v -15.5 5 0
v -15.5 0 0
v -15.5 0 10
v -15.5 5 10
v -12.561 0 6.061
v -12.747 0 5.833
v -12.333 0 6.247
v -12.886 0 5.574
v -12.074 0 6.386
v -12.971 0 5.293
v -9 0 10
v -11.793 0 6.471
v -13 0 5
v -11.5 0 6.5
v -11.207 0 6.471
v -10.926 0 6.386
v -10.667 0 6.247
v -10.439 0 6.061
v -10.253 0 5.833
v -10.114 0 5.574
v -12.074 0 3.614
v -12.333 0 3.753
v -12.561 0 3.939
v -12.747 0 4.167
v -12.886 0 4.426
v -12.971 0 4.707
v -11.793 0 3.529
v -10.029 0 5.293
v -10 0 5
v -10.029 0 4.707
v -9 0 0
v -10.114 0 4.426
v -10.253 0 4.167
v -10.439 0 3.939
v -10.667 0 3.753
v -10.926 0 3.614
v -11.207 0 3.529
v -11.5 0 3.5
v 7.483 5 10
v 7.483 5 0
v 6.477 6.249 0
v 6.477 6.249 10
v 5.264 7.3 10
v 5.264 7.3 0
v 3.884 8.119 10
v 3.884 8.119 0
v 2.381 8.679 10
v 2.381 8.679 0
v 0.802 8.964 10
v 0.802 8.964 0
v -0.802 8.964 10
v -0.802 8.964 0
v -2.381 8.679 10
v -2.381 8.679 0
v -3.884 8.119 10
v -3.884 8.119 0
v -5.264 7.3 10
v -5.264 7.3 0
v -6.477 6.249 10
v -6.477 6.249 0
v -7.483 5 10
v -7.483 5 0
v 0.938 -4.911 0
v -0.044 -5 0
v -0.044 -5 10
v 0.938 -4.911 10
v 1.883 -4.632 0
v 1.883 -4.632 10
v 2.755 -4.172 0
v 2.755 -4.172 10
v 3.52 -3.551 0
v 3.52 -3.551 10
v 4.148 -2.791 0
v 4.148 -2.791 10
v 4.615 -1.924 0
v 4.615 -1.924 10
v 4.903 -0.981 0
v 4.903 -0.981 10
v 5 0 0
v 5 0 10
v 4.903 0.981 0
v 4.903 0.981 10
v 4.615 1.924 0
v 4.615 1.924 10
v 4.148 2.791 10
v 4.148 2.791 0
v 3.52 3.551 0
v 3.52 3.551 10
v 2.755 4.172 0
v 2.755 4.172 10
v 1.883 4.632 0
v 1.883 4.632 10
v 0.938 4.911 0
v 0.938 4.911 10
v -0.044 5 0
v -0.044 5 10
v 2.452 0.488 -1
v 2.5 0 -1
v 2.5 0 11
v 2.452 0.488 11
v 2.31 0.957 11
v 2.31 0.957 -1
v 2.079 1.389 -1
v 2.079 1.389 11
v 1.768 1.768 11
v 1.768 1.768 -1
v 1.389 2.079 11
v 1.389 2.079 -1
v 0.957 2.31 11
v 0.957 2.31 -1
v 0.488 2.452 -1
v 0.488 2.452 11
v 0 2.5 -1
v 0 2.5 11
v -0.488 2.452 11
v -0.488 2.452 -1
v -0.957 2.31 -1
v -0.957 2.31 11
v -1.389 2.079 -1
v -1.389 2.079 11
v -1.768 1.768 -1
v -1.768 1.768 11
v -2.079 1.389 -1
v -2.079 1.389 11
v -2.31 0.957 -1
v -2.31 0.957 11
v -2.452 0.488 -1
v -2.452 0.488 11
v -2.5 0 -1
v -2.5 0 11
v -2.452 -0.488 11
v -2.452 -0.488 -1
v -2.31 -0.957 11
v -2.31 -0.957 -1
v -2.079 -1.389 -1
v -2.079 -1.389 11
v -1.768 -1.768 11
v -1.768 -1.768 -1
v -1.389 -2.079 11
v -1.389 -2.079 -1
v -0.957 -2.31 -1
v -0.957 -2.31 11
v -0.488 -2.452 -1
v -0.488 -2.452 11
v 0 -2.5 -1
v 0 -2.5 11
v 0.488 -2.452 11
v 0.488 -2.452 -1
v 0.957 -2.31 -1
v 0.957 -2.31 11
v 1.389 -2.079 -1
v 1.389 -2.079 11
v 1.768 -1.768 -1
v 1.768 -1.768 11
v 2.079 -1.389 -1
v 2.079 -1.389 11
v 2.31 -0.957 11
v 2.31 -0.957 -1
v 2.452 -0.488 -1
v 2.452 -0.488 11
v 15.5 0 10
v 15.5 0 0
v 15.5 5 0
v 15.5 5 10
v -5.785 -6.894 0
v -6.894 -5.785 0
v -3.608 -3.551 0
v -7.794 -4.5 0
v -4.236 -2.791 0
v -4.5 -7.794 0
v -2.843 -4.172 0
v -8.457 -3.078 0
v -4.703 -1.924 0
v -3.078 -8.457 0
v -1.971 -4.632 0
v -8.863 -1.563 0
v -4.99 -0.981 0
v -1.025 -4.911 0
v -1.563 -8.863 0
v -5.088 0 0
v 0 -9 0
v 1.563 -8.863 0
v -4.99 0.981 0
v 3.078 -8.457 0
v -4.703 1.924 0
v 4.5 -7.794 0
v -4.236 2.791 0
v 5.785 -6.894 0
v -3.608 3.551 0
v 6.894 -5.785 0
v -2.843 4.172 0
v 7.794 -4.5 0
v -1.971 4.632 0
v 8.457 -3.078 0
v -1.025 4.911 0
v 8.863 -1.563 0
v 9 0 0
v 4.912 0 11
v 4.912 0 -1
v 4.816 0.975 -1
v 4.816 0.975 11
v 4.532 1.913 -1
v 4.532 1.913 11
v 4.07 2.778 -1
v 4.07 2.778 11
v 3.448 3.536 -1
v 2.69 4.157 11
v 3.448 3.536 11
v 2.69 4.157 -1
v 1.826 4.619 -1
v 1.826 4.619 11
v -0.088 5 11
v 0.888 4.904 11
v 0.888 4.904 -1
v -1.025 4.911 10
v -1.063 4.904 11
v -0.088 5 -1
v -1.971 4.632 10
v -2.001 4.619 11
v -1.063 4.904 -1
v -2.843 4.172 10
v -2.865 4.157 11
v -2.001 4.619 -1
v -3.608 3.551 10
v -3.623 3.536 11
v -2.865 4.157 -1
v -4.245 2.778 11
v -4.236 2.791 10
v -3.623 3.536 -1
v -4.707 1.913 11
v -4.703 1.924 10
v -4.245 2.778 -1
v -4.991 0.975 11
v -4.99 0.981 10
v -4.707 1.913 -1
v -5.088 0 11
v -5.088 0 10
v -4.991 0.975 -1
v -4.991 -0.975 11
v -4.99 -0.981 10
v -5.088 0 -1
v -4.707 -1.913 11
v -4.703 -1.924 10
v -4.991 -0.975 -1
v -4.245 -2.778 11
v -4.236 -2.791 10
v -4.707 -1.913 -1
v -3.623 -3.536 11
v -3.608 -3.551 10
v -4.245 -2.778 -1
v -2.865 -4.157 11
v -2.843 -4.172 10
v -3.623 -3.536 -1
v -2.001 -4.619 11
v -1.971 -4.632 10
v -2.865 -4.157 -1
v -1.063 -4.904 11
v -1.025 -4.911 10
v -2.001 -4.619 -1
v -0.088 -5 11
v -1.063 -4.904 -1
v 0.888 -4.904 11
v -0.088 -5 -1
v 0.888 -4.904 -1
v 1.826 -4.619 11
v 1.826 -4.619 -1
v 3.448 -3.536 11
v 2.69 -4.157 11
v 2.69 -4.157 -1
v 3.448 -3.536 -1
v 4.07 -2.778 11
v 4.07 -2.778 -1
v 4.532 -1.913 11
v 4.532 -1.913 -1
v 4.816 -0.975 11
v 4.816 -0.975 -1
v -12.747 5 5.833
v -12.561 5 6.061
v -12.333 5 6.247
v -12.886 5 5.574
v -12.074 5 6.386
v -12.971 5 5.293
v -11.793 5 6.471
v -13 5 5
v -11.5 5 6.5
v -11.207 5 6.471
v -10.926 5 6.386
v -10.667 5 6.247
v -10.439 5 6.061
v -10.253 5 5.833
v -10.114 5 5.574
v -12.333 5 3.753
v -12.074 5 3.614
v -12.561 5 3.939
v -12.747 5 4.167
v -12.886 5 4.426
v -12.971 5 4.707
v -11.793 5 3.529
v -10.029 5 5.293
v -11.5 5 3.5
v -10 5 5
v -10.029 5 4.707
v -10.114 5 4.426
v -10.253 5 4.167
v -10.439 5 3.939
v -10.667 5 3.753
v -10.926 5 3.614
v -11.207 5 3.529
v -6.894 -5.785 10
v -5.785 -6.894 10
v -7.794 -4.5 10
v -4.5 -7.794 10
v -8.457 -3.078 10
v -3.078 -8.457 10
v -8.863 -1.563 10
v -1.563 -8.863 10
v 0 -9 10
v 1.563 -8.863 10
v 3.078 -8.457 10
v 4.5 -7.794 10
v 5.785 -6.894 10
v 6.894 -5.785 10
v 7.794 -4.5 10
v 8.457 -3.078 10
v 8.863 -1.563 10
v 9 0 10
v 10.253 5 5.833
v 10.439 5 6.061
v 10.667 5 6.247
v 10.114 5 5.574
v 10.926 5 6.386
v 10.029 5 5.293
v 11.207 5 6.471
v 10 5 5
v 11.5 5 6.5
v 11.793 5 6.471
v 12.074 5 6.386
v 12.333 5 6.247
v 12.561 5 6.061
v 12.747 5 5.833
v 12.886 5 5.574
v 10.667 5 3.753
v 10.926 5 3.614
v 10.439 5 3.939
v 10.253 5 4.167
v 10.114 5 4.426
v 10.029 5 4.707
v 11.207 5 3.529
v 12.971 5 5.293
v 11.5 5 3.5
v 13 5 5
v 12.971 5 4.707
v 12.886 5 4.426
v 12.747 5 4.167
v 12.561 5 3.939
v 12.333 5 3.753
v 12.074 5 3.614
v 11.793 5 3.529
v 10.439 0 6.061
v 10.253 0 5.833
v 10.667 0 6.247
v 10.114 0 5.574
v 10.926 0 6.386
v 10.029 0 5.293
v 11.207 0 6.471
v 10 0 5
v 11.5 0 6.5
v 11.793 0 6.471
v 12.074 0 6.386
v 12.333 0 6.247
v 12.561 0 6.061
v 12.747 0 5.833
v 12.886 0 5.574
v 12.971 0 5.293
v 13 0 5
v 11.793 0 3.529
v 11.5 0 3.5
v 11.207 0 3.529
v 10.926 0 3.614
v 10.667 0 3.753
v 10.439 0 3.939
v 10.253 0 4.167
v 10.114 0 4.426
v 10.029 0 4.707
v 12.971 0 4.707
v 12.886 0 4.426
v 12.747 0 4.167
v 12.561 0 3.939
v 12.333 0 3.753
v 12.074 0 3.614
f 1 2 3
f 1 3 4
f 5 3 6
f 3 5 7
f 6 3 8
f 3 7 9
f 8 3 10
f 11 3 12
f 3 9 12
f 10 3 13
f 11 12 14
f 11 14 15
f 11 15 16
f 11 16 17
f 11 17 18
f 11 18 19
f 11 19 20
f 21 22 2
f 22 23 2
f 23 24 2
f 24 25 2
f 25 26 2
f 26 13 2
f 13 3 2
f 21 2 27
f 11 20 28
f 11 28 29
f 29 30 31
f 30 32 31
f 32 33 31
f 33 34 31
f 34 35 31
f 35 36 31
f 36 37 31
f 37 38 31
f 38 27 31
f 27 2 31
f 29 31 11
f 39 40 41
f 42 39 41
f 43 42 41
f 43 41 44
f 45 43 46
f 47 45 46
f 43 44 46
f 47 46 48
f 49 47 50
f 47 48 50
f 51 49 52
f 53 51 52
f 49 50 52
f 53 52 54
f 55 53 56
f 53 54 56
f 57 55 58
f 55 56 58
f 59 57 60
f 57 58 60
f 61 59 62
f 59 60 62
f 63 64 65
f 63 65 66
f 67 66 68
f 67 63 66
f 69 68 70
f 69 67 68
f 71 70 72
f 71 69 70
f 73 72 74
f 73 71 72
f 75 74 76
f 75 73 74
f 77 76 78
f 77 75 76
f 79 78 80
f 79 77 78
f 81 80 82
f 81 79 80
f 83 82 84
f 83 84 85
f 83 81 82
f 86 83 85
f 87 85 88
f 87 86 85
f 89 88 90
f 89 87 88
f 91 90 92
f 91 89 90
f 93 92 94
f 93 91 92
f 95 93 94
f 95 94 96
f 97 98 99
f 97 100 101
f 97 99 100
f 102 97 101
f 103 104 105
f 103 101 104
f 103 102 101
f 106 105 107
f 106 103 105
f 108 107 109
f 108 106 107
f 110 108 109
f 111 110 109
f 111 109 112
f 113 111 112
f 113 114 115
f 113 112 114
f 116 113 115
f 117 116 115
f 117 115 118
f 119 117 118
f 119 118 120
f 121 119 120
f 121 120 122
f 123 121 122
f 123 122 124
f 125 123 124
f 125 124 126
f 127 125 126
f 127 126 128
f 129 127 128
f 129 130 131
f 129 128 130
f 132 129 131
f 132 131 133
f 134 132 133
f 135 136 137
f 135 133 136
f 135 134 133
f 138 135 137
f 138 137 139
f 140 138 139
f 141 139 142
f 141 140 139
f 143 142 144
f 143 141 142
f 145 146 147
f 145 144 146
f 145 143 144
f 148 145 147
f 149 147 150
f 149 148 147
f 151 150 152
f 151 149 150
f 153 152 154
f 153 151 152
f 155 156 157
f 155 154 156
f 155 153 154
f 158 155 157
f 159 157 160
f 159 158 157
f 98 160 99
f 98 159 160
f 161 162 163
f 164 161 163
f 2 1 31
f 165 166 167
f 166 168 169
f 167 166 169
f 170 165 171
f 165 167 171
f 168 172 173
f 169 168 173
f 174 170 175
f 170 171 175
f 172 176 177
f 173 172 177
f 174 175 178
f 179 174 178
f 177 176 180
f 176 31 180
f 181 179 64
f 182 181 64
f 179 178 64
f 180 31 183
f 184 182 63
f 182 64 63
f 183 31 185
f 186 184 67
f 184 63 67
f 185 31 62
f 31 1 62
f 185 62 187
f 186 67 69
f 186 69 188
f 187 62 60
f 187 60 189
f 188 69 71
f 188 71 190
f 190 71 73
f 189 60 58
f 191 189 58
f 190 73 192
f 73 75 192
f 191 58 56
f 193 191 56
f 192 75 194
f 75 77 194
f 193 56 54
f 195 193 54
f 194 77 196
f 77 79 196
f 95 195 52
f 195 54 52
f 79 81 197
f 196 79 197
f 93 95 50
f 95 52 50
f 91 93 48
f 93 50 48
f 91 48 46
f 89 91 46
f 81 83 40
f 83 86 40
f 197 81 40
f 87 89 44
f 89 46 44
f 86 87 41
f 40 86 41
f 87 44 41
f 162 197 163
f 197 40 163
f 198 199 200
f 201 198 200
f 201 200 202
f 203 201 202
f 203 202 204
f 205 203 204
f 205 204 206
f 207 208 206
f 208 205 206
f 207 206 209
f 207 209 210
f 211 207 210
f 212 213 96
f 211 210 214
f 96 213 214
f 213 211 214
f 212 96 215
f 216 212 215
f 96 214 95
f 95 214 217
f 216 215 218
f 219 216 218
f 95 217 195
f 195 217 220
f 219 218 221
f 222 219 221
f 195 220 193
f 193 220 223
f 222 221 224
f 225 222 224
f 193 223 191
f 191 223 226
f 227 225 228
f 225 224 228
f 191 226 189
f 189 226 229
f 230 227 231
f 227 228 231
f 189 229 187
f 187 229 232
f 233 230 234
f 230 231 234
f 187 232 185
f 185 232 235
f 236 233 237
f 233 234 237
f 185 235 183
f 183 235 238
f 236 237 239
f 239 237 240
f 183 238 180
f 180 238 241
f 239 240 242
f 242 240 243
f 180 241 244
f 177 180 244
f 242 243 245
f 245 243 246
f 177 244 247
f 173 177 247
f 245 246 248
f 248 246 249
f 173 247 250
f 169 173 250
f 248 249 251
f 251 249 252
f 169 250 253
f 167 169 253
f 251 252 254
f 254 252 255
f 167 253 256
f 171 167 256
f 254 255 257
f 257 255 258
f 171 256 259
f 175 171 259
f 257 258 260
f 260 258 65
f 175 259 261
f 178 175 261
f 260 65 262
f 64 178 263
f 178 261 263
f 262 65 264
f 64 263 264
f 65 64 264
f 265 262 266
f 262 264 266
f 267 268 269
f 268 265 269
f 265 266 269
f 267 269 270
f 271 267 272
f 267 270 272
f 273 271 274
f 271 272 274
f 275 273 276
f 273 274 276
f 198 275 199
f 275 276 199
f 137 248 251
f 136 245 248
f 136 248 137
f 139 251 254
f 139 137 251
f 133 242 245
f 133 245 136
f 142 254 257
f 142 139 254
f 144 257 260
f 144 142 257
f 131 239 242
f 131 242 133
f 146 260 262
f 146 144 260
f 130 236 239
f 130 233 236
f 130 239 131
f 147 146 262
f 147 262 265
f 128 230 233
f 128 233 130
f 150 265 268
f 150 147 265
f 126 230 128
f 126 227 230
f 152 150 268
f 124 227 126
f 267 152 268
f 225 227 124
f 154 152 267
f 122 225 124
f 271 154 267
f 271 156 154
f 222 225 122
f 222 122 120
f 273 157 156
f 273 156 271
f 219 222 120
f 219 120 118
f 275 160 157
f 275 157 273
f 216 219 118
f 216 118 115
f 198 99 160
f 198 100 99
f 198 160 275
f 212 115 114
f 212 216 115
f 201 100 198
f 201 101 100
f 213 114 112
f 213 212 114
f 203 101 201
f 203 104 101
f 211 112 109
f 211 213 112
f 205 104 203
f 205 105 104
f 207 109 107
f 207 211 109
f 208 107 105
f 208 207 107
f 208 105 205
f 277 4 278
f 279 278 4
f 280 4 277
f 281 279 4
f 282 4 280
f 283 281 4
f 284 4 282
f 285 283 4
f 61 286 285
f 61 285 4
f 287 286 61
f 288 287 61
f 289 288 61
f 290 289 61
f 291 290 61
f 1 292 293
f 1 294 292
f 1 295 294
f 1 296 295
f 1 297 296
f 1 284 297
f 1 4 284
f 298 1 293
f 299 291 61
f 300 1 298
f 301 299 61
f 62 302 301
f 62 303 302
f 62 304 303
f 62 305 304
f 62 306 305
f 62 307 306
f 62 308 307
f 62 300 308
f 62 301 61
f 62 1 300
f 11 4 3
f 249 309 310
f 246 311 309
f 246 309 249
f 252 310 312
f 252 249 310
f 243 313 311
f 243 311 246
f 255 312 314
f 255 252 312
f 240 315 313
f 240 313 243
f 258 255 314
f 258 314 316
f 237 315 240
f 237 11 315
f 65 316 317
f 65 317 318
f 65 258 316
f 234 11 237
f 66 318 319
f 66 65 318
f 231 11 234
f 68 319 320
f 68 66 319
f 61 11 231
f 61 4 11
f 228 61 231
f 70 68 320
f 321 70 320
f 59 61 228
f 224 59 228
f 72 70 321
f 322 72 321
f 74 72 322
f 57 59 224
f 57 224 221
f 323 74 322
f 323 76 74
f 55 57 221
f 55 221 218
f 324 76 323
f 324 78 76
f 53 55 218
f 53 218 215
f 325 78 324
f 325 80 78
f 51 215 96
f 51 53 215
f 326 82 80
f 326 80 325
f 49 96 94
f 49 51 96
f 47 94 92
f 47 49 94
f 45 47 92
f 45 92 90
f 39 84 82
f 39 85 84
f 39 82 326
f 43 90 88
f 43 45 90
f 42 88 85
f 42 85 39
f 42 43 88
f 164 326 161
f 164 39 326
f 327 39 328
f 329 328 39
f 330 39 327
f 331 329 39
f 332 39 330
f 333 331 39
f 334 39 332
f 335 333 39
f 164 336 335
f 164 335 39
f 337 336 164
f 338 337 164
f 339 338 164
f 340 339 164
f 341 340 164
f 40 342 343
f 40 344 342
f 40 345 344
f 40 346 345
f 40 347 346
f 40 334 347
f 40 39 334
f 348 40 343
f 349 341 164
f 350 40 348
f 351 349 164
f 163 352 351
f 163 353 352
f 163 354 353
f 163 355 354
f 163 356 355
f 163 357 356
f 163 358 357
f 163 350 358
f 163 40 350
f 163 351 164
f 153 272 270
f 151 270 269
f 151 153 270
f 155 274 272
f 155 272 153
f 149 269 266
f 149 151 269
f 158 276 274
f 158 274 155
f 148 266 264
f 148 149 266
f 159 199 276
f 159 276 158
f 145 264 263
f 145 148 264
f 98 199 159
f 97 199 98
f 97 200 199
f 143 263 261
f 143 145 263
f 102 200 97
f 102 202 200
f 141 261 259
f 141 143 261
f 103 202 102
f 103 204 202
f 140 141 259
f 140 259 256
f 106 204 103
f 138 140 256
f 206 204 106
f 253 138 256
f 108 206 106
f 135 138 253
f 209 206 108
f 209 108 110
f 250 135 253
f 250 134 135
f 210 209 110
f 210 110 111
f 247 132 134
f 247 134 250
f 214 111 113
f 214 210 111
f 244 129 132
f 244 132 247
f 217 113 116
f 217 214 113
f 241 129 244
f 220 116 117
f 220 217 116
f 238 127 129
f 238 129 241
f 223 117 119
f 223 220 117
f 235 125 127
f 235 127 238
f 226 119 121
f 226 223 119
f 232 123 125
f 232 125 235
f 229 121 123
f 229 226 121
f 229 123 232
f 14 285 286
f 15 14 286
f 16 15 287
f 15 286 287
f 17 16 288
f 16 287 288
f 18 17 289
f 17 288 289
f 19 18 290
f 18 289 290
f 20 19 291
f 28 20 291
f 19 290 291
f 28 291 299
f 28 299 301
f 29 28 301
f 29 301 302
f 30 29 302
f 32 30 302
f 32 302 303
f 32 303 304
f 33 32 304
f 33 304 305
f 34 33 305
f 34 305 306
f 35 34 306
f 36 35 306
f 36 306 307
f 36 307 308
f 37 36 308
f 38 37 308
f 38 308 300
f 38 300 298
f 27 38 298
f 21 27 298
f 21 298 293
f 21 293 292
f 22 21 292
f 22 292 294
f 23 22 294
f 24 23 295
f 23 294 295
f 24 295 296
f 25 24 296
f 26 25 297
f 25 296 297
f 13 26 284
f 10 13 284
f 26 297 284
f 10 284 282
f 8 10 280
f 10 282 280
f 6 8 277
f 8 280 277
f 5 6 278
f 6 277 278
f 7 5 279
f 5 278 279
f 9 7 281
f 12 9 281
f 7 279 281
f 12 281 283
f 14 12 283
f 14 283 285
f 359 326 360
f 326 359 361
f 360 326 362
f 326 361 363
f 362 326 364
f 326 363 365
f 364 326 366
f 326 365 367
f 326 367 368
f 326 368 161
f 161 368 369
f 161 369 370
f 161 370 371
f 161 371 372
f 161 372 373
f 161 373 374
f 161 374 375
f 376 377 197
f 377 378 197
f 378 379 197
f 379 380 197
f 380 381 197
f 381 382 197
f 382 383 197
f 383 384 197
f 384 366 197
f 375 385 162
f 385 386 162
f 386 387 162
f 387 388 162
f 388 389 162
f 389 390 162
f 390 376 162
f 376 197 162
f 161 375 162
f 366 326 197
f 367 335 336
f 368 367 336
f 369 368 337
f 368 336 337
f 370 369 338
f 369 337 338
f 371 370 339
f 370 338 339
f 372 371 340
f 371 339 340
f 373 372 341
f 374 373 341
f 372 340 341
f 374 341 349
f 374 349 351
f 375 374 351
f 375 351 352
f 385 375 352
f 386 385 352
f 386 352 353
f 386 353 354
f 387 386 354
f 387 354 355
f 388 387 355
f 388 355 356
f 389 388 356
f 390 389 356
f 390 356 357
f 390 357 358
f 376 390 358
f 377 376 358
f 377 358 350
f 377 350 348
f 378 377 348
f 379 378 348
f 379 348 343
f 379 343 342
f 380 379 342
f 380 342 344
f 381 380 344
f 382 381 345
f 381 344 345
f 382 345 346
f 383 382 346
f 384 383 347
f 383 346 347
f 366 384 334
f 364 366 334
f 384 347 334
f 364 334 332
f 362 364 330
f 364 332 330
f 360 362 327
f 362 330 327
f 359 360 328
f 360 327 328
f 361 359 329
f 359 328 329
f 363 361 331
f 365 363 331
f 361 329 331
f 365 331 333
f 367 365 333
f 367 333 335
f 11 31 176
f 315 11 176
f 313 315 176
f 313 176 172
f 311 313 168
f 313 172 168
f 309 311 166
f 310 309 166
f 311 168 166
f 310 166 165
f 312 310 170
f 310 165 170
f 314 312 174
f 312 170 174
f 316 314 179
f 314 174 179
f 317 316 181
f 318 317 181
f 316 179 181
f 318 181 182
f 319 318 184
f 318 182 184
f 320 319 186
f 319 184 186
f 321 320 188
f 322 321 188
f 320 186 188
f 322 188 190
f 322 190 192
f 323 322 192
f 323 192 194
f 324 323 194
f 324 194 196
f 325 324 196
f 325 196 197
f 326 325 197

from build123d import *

# Parameters (mm, degrees)
SKETCH1_R                = 0.9
SKETCH1_R_2              = 0.5
SKETCH1_W                = 1
SKETCH1_H                = 0.5
BOSS_EXTRUDE1_DEPTH      = 1
BOSS_EXTRUDE2_DEPTH      = 11
BOSS_EXTRUDE2_DEPTH_BACK = 1.2
SKETCH2_R                = 0.5
SKETCH2_R_2              = 0.25
SKETCH3_R                = 0.66091417
CUT_EXTRUDE3_DEPTH       = 0.1
SKETCH4_R                = 0.55
CUT_EXTRUDE4_DEPTH       = 10.9
SKETCH5_R                = 0.15
CUT_EXTRUDE5_DEPTH       = 10.9
SCALE1_SCALE             = 10


with BuildPart() as part:
    # Sketch1 → Boss-Extrude1 (new body)
    # profile 1 of 3: a face of its own
    with BuildSketch(Plane.XY):
        Circle(SKETCH1_R)
        Circle(SKETCH1_R_2, mode=Mode.SUBTRACT)
    # profile 2 of 3: a face of its own
    with BuildSketch(Plane.XY):
        with Locations((1.05, 0.25)):
            Rectangle(SKETCH1_W, SKETCH1_H)
    # profile 3 of 3: a face of its own
    with BuildSketch(Plane.XY):
        with Locations((-1.05, 0.25)):
            Rectangle(SKETCH1_W, SKETCH1_H)
    extrude(amount=BOSS_EXTRUDE1_DEPTH)

    # Sketch2 → Boss-Extrude2 (add, two sides: drawn at the far end of the back side and taken through both)
    with BuildSketch(Plane.XY.offset(1).offset(-BOSS_EXTRUDE2_DEPTH_BACK)):
        with Locations((-0.008750419, 0)):
            Circle(SKETCH2_R)
        Circle(SKETCH2_R_2, mode=Mode.SUBTRACT)
    extrude(amount=BOSS_EXTRUDE2_DEPTH + BOSS_EXTRUDE2_DEPTH_BACK)

    # Sketch3 → Cut-Extrude3 (cut)
    with BuildSketch(Plane(origin=(0, 0, -0.2), x_dir=(-1, 0, 0), z_dir=(0, 0, -1))):
        with Locations((0.008750419, 0)):
            Circle(SKETCH3_R)
    extrude(amount=-CUT_EXTRUDE3_DEPTH, mode=Mode.SUBTRACT)

    # Sketch4 → Cut-Extrude4 (cut)
    with BuildSketch(Plane.XY.offset(12)):
        Circle(SKETCH4_R)
    extrude(amount=-CUT_EXTRUDE4_DEPTH, mode=Mode.SUBTRACT)

    # Sketch5 → Cut-Extrude5 (cut)
    with BuildSketch(Plane(origin=(0, 0.5, 0), x_dir=(1, 0, 0), z_dir=(0, 1, 0))):
        with Locations(Location((1.15, -0.5, 0), (0, 0, 270))):
            Circle(SKETCH5_R)
        with Locations(Location((-1.15, -0.5, 0), (0, 0, 270))):
            Circle(SKETCH5_R)
    extrude(amount=-CUT_EXTRUDE5_DEPTH, mode=Mode.SUBTRACT)


with BuildPart() as part_1:
    # Scale1: scaled about (0, 0, 0)
    add(part.part.scale(SCALE1_SCALE))


solid = part_1.part
